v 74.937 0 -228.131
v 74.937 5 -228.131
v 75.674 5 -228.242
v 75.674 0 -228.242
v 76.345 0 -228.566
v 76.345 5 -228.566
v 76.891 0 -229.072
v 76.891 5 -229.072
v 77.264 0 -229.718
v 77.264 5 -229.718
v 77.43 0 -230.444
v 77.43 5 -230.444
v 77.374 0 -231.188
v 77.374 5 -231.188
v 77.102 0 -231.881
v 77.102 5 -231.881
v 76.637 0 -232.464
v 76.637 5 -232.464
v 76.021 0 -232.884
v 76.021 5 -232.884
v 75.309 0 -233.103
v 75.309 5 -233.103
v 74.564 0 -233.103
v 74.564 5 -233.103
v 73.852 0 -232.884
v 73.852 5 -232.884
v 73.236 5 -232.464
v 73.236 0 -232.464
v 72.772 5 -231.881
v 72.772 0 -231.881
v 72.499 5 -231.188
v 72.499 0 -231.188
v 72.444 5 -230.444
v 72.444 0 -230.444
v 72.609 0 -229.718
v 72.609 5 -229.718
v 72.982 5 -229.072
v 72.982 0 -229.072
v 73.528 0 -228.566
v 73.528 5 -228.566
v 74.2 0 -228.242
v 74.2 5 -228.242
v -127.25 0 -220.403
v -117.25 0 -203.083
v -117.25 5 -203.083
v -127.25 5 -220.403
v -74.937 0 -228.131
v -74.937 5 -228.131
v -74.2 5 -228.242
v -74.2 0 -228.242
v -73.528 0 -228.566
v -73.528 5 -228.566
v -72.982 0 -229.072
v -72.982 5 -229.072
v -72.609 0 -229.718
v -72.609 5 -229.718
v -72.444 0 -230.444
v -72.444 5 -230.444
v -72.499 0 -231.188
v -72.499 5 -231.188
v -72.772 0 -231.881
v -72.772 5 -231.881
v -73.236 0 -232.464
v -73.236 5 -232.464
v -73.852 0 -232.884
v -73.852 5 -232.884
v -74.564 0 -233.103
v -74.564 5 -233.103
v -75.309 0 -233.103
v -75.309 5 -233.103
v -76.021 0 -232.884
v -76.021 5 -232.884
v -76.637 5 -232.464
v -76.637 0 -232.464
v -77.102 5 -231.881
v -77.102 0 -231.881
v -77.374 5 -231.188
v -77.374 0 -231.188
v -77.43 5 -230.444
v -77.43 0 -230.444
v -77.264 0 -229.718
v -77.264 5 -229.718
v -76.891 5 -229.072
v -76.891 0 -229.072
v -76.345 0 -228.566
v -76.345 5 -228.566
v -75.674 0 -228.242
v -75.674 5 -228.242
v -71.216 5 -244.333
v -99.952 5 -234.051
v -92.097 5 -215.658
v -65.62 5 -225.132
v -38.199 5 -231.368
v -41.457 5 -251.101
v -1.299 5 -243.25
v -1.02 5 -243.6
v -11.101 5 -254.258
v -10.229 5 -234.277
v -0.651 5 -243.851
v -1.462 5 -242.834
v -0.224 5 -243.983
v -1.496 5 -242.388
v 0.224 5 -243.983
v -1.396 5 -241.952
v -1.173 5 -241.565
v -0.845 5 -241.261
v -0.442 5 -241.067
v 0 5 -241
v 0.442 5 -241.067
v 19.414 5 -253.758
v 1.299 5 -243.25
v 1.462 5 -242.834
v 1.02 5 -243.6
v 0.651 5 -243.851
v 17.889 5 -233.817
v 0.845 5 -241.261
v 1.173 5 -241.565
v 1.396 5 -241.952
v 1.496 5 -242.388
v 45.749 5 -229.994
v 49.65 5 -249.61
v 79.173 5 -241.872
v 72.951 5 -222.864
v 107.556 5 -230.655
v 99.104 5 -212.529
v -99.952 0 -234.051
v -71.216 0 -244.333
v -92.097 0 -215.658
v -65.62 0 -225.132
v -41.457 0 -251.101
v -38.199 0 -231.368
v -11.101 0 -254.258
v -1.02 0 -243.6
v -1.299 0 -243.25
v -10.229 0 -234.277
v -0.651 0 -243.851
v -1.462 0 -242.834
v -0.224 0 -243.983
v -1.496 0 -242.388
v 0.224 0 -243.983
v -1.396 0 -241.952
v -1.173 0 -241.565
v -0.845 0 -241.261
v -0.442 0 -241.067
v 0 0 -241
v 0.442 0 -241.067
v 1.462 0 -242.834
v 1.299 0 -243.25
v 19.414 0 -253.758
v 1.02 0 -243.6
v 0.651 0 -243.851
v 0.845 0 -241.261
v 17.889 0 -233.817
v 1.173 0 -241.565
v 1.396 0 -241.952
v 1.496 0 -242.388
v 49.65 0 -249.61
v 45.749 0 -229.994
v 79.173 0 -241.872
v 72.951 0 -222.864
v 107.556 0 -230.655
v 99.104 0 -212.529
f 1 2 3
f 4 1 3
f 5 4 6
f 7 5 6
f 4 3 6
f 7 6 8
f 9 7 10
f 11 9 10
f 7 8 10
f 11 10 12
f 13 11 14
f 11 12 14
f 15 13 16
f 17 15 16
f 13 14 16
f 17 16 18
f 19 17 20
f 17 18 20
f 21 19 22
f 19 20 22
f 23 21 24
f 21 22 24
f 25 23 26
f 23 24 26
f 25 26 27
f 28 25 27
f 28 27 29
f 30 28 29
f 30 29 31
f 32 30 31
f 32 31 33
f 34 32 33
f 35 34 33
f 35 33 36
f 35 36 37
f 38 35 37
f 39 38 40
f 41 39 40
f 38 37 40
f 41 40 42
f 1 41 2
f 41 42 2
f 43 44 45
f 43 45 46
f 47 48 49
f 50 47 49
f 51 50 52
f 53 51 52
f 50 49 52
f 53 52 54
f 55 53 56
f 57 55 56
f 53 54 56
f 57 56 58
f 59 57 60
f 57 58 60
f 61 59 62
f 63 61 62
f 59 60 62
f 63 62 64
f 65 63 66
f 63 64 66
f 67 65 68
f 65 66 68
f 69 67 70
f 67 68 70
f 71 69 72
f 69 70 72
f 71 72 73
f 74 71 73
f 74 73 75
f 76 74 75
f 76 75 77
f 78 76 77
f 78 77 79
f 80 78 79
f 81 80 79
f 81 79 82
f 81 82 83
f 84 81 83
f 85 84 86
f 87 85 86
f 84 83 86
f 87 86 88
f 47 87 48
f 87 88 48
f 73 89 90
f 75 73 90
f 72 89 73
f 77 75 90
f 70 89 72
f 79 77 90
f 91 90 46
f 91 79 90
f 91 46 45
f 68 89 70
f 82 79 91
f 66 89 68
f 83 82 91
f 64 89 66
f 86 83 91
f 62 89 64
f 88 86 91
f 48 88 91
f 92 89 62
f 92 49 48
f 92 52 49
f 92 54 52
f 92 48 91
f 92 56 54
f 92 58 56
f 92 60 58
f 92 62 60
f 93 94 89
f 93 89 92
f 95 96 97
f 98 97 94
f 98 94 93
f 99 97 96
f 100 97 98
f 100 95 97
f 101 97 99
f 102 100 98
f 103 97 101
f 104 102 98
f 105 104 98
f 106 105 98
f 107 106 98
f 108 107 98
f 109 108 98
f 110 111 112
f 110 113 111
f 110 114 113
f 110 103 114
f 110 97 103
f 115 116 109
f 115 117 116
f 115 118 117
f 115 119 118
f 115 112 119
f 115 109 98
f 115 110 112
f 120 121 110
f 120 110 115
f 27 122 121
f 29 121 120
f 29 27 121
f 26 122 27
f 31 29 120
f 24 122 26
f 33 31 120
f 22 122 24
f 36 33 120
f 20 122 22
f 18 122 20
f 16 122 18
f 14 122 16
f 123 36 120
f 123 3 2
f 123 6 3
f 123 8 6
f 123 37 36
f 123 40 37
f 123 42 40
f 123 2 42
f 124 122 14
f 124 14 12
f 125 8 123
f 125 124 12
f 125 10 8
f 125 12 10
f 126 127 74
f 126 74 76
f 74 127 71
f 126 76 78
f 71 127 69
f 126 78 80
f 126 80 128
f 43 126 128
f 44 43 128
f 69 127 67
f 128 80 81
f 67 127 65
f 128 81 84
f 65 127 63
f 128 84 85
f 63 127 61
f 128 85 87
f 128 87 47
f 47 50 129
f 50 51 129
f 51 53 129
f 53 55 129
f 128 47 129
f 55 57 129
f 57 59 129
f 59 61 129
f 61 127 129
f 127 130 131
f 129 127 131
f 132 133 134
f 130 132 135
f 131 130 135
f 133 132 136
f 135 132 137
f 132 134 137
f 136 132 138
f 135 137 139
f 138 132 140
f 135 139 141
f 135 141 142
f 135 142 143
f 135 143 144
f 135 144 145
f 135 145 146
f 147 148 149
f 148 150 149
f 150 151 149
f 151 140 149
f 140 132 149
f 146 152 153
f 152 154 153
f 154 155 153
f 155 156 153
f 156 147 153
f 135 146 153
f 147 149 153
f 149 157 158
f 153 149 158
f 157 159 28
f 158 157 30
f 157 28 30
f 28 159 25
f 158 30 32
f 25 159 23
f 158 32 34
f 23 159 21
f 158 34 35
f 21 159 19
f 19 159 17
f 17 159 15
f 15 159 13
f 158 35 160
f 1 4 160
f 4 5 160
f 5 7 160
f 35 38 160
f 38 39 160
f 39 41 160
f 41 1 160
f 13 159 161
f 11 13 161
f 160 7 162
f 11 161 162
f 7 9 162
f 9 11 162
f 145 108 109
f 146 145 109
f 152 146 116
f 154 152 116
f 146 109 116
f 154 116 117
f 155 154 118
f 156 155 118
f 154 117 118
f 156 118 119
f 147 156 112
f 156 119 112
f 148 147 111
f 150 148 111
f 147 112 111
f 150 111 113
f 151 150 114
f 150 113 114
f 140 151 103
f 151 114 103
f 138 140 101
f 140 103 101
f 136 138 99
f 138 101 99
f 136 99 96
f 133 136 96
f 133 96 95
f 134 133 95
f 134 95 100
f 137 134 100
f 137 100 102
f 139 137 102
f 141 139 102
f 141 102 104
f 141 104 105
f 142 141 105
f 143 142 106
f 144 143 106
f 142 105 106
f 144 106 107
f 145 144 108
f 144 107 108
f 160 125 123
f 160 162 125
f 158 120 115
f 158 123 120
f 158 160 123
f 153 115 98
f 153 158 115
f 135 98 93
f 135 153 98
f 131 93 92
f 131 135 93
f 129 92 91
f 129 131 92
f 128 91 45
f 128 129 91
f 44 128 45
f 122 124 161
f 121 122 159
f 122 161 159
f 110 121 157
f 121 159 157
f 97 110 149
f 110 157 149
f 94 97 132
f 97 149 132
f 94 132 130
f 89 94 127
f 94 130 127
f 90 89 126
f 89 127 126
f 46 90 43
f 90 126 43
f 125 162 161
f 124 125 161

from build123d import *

# Parameters (mm, degrees)
SKETCH1_R           = 254.5
SKETCH1_R_2         = 234.5
BOSS_EXTRUDE1_DEPTH = 5
SKETCH2_W           = 27.805822748
SKETCH2_H           = 60
CUT_EXTRUDE1_DEPTH  = 5
SKETCH3_R           = 2.5
CUT_EXTRUDE2_DEPTH  = 5
SKETCH4_R           = 1.5
CUT_EXTRUDE3_DEPTH  = 5
SKETCH5_W           = 651.212620435
SKETCH5_H           = 357.226439325
CUT_EXTRUDE4_DEPTH  = 10
CUT_EXTRUDE9_START  = -10
SKETCH6_R           = 1.5
SKETCH6_R_2         = 2.5
CUT_EXTRUDE9_DEPTH  = 10
CUT_EXTRUDE10_START = -10
CUT_EXTRUDE10_DEPTH = 10


with BuildPart() as part:
    # Sketch1 → Boss-Extrude1 (new body)
    with BuildSketch(Plane(origin=(0, 0, 0), x_dir=(1, 0, 0), z_dir=(0, 1, 0))):
        with Locations(Location((0, 0, 0), (0, 0, 270))):
            Circle(SKETCH1_R)
        with Locations(Location((0, 0, 0), (0, 0, 270))):
            Circle(SKETCH1_R_2, mode=Mode.SUBTRACT)
    extrude(amount=BOSS_EXTRUDE1_DEPTH)

    # Sketch2 → Cut-Extrude1 (cut)
    with BuildSketch(Plane(origin=(0, 5, 0), x_dir=(1, 0, 0), z_dir=(0, 1, 0))):
        with Locations((-240.597088626, 30)):
            Rectangle(SKETCH2_W, SKETCH2_H)
    cut_extrude1 = extrude(amount=-CUT_EXTRUDE1_DEPTH, mode=Mode.SUBTRACT)

    # Mirror1: Cut-Extrude1 across plane
    add(cut_extrude1.mirror(Plane.XY), mode=Mode.SUBTRACT)

    # Sketch3 → Cut-Extrude2 (cut)
    with BuildSketch(Plane(origin=(0, 5, 0), x_dir=(1, 0, 0), z_dir=(0, 1, 0))):
        with Locations(Location((242.5, 0, 0), (0, 0, 270))):
            Circle(SKETCH3_R)
        with Locations(Location((196.186621136, -142.537923681, 0), (0, 0, 270))):
            Circle(SKETCH3_R)
        with Locations(Location((74.936621136, -230.631205202, 0), (0, 0, 270))):
            Circle(SKETCH3_R)
        with Locations(Location((-74.936621136, -230.631205202, 0), (0, 0, 270))):
            Circle(SKETCH3_R)
        with Locations(Location((-196.186621136, -142.537923681, 0), (0, 0, 270))):
            Circle(SKETCH3_R)
        with Locations((-242.5, 0)):
            Circle(SKETCH3_R)
        with Locations(Location((-196.186621136, 142.537923681, 0), (0, 0, 270))):
            Circle(SKETCH3_R)
        with Locations(Location((-74.936621136, 230.631205202, 0), (0, 0, 270))):
            Circle(SKETCH3_R)
        with Locations(Location((74.936621136, 230.631205202, 0), (0, 0, 270))):
            Circle(SKETCH3_R)
        with Locations(Location((196.186621136, 142.537923681, 0), (0, 0, 270))):
            Circle(SKETCH3_R)
    extrude(amount=-CUT_EXTRUDE2_DEPTH, mode=Mode.SUBTRACT)

    # Sketch4 → Cut-Extrude3 (cut)
    with BuildSketch(Plane(origin=(0, 5, 0), x_dir=(1, 0, 0), z_dir=(0, 1, 0))):
        with Locations(Location((0, -242.5, 0), (0, 0, 270))):
            Circle(SKETCH4_R)
        with Locations(Location((-142.537923681, -196.186621136, 0), (0, 0, 270))):
            Circle(SKETCH4_R)
        with Locations(Location((-230.631205202, -74.936621136, 0), (0, 0, 270))):
            Circle(SKETCH4_R)
        with Locations(Location((-230.631205202, 74.936621136, 0), (0, 0, 270))):
            Circle(SKETCH4_R)
        with Locations(Location((-142.537923681, 196.186621136, 0), (0, 0, 270))):
            Circle(SKETCH4_R)
        with Locations(Location((0, 242.5, 0), (0, 0, 270))):
            Circle(SKETCH4_R)
        with Locations(Location((142.537923681, 196.186621136, 0), (0, 0, 270))):
            Circle(SKETCH4_R)
        with Locations(Location((230.631205202, 74.936621136, 0), (0, 0, 270))):
            Circle(SKETCH4_R)
        with Locations(Location((230.631205202, -74.936621136, 0), (0, 0, 270))):
            Circle(SKETCH4_R)
        with Locations(Location((142.537923681, -196.186621136, 0), (0, 0, 270))):
            Circle(SKETCH4_R)
    extrude(amount=-CUT_EXTRUDE3_DEPTH, mode=Mode.SUBTRACT)

    # Sketch5 → Cut-Extrude4 (cut)
    with BuildSketch(Plane(origin=(0, 5, 0), x_dir=(1, 0, 0), z_dir=(0, 1, 0))):
        with Locations((-71.106310217, -178.613219663)):
            Rectangle(SKETCH5_W, SKETCH5_H)
    extrude(amount=-CUT_EXTRUDE4_DEPTH, mode=Mode.SUBTRACT)

    # Sketch6 → Cut-Extrude9 (cut)
    # profile 1 of 2: a face of its own
    with BuildSketch(Plane(origin=(0, 5, 0), x_dir=(1, 0, 0), z_dir=(0, 1, 0)).offset(CUT_EXTRUDE9_START)):
        with BuildLine():
            Line((-117.25, 203.082957187), (-127.25, 220.403465263))
            ThreePointArc((-127.25, 220.403465263), (-203.737945948, 152.51589878), (-247.326201604, 60))
            Line((-247.326201604, 60), (-226.694177252, 60))
            ThreePointArc((-226.694177252, 60), (-186.259449225, 142.469883043), (-117.25, 203.082957187))
        make_face()
        with Locations((-230.631205202, 74.936621136)):
            Circle(SKETCH6_R, mode=Mode.SUBTRACT)
        with Locations((-196.186621136, 142.537923681)):
            Circle(SKETCH6_R_2, mode=Mode.SUBTRACT)
        with Locations((-142.537923681, 196.186621136)):
            Circle(SKETCH6_R, mode=Mode.SUBTRACT)
    # profile 2 of 2: a face of its own
    with BuildSketch(Plane(origin=(0, 5, 0), x_dir=(1, 0, 0), z_dir=(0, 1, 0)).offset(CUT_EXTRUDE9_START)):
        with BuildLine():
            Line((-254.5, 0), (0, 0))
            Line((0, 0), (-117.25, 203.082957187))
            ThreePointArc((-117.25, 203.082957187), (-186.259449225, 142.469883043), (-226.694177252, 60))
            Line((-226.694177252, 60), (-247.326201604, 60))
            ThreePointArc((-247.326201604, 60), (-252.700186296, 30.213669851), (-254.5, 0))
        make_face()
    extrude(amount=CUT_EXTRUDE9_DEPTH, mode=Mode.SUBTRACT)

    # Sketch7 → Cut-Extrude10 (cut)
    with BuildSketch(Plane(origin=(0, 5, 0), x_dir=(1, 0, 0), z_dir=(0, 1, 0)).offset(CUT_EXTRUDE10_START)):
        with BuildLine():
            Line((254.5, 0), (0, 0))
            Line((0, 0), (107.556347613, 230.655331801))
            ThreePointArc((107.556347613, 230.655331801), (214.643122959, 136.742750324), (254.5, 0))
        make_face()
    extrude(amount=CUT_EXTRUDE10_DEPTH, mode=Mode.SUBTRACT)


solid = part.part
